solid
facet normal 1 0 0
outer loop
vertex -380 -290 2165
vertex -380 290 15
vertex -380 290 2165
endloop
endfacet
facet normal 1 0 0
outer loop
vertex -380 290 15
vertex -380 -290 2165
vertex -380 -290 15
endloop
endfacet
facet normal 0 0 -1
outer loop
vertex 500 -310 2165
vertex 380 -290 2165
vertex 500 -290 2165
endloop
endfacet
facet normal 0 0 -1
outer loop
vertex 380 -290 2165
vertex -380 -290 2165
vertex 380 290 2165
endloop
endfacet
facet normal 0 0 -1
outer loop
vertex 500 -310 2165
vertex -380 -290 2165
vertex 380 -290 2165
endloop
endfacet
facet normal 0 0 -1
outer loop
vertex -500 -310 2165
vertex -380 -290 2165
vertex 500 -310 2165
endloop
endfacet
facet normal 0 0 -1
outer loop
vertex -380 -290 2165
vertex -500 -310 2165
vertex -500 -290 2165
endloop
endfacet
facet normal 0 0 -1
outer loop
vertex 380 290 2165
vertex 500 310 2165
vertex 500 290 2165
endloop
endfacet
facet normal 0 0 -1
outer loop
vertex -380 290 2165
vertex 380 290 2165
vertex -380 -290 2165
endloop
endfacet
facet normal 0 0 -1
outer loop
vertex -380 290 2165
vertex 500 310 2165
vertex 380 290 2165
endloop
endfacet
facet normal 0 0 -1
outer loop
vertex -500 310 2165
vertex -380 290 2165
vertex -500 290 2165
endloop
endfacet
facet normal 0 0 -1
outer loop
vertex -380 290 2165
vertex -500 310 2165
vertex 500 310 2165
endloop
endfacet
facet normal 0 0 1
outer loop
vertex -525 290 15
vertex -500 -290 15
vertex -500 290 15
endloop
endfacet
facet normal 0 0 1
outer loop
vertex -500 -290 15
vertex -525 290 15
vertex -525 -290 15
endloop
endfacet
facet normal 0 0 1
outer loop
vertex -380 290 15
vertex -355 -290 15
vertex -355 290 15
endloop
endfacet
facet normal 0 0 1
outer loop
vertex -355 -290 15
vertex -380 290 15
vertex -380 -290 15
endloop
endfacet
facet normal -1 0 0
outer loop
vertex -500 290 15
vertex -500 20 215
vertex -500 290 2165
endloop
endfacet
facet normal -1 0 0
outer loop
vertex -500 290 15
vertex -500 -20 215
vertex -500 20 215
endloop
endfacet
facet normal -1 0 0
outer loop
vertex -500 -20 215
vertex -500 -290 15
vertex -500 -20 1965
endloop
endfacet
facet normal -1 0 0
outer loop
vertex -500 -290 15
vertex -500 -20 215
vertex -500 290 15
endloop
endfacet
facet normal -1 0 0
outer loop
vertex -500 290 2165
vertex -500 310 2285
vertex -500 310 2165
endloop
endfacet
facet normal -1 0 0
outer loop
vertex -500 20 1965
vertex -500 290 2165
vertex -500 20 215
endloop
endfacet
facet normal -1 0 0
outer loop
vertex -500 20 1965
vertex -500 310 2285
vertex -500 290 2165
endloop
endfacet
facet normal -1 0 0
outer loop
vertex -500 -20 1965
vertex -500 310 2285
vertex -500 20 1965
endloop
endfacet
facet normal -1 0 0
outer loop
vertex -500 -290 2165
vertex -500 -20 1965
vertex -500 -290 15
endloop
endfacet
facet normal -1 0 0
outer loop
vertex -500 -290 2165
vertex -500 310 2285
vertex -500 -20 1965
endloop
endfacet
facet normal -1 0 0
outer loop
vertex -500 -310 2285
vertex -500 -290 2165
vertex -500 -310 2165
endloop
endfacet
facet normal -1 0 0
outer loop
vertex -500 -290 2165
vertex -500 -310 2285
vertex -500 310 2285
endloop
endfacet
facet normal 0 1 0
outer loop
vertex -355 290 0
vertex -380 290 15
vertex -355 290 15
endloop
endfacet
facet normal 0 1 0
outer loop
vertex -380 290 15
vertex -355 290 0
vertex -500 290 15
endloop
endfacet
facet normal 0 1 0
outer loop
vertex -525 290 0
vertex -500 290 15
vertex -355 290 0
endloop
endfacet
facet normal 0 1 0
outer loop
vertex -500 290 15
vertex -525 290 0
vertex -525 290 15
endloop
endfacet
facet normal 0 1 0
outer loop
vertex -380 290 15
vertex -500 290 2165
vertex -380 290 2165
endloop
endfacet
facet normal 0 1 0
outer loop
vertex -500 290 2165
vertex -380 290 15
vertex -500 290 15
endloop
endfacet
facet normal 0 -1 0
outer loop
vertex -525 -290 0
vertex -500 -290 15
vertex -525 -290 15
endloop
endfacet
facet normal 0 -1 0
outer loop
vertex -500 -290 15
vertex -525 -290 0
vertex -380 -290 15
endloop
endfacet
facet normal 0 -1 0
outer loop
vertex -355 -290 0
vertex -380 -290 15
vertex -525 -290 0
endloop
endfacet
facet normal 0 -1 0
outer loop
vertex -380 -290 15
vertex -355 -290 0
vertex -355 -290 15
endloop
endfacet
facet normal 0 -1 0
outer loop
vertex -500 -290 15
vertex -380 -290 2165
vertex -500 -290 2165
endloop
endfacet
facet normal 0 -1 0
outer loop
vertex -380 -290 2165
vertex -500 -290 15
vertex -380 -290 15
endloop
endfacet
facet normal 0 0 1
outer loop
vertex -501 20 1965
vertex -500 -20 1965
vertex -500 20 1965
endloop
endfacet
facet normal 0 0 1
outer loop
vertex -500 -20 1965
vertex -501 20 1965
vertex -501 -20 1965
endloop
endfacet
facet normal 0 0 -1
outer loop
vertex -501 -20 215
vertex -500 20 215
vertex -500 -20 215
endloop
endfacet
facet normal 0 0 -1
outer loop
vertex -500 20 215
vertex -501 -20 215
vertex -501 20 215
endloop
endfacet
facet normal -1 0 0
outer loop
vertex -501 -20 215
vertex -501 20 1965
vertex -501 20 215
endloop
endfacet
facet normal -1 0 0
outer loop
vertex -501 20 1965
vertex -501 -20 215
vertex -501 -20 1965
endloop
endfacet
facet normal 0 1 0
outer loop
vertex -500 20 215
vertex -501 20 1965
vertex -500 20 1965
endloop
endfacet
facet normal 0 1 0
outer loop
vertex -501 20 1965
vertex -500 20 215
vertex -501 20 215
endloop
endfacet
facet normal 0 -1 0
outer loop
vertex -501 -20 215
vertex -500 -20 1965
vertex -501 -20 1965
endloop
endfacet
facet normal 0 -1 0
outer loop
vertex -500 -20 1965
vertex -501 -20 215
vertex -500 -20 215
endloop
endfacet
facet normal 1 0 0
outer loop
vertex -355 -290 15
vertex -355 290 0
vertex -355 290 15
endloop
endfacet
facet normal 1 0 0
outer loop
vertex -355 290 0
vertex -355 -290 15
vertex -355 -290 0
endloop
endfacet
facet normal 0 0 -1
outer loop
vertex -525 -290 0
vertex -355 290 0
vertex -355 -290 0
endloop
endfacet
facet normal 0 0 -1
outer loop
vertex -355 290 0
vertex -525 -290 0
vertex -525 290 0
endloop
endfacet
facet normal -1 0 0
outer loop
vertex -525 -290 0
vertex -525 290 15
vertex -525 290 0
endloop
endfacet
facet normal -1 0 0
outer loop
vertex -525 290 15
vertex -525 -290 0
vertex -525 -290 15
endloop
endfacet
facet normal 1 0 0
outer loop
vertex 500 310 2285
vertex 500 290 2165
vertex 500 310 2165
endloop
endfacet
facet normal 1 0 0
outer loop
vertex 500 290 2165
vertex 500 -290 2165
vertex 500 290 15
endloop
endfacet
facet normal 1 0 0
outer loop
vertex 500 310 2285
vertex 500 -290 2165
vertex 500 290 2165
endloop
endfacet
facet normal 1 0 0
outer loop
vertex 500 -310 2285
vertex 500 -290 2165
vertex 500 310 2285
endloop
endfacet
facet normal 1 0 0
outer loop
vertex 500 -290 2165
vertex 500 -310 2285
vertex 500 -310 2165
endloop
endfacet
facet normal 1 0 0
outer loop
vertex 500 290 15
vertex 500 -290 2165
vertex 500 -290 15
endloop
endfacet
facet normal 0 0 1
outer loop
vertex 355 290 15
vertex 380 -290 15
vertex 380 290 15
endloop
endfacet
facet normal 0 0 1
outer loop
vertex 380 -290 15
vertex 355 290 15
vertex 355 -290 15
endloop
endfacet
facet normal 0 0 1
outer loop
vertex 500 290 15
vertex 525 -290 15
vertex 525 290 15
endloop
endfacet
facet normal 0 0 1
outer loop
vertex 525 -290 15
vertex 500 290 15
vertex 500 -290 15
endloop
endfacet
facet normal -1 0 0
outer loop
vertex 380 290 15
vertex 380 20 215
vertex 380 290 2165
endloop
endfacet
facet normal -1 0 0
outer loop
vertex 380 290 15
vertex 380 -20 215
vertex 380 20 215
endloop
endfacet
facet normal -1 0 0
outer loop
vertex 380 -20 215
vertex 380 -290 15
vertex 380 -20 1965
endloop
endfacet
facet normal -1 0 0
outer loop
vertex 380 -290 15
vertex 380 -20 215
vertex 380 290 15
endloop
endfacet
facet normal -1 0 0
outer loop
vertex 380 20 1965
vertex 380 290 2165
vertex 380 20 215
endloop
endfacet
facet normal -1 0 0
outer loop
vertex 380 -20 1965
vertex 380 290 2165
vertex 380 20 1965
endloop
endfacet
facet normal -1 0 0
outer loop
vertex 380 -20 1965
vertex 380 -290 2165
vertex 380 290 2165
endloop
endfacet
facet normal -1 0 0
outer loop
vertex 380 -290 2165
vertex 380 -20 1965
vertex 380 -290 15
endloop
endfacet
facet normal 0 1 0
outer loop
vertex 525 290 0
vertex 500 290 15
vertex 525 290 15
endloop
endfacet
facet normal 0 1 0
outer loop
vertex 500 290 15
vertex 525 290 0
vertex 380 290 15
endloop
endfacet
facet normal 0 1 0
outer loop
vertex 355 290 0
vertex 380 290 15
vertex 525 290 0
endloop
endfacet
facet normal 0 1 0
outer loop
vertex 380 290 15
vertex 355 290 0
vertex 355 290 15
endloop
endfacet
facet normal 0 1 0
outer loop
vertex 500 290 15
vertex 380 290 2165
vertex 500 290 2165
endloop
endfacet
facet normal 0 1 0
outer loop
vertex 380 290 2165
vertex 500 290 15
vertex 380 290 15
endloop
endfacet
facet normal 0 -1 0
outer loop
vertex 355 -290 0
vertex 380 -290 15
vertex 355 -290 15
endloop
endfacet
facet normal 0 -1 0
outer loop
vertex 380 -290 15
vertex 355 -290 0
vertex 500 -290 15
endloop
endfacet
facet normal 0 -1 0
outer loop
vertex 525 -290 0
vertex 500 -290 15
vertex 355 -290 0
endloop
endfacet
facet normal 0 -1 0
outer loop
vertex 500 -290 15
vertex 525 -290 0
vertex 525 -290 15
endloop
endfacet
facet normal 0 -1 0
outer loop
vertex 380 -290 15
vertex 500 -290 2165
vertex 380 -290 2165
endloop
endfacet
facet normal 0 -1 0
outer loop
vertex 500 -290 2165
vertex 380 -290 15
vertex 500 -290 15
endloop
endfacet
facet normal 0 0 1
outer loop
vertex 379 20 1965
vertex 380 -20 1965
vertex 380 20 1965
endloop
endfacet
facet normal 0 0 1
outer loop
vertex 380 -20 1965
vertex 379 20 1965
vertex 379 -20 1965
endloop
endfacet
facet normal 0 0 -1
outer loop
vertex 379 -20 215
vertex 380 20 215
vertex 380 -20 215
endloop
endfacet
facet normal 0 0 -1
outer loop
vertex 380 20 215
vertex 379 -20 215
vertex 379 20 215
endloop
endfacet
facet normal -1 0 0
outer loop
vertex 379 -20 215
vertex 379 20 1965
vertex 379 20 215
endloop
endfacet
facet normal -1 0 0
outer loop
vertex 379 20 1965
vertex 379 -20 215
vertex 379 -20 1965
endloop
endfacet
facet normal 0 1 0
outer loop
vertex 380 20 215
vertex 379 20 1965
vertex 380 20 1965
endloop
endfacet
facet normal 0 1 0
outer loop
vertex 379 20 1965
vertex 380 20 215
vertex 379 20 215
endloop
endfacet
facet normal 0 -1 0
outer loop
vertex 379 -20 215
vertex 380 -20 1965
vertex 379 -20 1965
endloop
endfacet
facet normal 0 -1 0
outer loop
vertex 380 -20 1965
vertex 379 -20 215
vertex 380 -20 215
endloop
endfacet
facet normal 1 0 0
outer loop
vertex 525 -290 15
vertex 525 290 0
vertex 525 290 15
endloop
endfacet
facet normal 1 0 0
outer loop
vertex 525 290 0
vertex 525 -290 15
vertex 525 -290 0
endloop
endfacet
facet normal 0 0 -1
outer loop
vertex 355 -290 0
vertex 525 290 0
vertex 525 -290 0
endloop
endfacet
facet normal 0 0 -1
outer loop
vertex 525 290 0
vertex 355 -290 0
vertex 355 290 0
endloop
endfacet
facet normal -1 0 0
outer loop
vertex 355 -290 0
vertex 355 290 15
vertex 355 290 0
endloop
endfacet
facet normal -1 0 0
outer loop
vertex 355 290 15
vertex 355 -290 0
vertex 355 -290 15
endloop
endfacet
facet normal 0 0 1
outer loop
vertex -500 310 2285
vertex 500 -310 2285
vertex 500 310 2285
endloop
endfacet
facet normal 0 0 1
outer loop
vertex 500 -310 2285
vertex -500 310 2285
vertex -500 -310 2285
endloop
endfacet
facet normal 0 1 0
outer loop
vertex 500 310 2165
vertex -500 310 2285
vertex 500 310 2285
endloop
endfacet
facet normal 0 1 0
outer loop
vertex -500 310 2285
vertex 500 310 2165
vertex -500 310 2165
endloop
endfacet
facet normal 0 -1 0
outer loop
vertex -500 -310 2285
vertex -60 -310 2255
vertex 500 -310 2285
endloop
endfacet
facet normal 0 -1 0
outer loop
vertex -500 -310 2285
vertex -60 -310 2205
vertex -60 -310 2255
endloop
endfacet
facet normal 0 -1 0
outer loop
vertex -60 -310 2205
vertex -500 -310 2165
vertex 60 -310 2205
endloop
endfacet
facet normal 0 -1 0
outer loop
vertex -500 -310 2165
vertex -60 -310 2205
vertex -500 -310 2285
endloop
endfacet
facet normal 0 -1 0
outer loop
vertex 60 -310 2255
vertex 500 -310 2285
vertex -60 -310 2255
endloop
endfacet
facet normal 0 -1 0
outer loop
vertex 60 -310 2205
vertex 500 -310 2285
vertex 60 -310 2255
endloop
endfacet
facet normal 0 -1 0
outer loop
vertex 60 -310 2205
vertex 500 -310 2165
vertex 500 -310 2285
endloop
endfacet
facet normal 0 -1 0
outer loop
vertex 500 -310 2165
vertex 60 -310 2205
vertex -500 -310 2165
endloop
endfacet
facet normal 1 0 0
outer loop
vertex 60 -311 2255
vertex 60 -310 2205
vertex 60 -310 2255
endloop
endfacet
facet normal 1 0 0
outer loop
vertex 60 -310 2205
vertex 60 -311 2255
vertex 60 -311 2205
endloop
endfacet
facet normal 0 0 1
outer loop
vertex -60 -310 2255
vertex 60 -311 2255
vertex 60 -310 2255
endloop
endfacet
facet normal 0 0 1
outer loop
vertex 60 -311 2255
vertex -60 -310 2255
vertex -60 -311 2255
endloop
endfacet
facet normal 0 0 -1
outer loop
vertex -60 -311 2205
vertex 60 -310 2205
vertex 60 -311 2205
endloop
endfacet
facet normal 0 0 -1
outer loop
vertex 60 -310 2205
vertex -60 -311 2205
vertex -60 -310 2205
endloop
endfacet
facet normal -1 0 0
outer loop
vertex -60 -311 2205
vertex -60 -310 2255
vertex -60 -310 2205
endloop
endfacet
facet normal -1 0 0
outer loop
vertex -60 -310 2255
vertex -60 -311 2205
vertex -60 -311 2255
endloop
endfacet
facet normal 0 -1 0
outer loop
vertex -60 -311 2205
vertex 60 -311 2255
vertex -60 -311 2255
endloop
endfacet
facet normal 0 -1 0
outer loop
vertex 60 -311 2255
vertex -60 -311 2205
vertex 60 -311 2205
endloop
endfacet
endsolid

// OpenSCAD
// ============================================================================
// Parametric 3D Model: Walk-Through Metal Detector (WTMD)
// OpenSCAD Reference Project File
// ============================================================================

// Main Parameters
passage_width = 760;
passage_height = 2000;
panel_depth = 580;
panel_width = 120;
panel_height = 2150;
base_thickness = 15;
base_overhang = 50;

console_height = 120;
console_depth = 620;
console_width = passage_width + (2 * panel_width);

module base_plate() {
    color("DimGray")
    translate([-(panel_width + base_overhang)/2, -panel_depth/2, 0])
    cube([panel_width + base_overhang, panel_depth, base_thickness]);
}

module vertical_panel() {
    color("DarkSlateGray")
    translate([-panel_width/2, -panel_depth/2, base_thickness])
    cube([panel_width, panel_depth, panel_height]);
    
    // Decorative LED strip indicator slot
    color("DodgerBlue")
    translate([-panel_width/2 - 1, -20, base_thickness + 200])
    cube([2, 40, panel_height - 400]);
}

module top_console() {
    color("Silver")
    translate([-console_width/2, -console_depth/2, base_thickness + panel_height])
    cube([console_width, console_depth, console_height]);
    
    // Display screen placeholder
    color("Black")
    translate([-60, -console_depth/2 - 1, base_thickness + panel_height + 40])
    cube([120, 2, 50]);
}

module wtmd_assembly() {
    // Left Base & Panel
    translate([-passage_width/2 - panel_width/2, 0, 0]) {
        base_plate();
        vertical_panel();
    }
    
    // Right Base & Panel
    translate([passage_width/2 + panel_width/2, 0, 0]) {
        base_plate();
        vertical_panel();
    }
    
    // Top Control Console Bridge
    top_console();
}

// Render Assembly
wtmd_assembly();
